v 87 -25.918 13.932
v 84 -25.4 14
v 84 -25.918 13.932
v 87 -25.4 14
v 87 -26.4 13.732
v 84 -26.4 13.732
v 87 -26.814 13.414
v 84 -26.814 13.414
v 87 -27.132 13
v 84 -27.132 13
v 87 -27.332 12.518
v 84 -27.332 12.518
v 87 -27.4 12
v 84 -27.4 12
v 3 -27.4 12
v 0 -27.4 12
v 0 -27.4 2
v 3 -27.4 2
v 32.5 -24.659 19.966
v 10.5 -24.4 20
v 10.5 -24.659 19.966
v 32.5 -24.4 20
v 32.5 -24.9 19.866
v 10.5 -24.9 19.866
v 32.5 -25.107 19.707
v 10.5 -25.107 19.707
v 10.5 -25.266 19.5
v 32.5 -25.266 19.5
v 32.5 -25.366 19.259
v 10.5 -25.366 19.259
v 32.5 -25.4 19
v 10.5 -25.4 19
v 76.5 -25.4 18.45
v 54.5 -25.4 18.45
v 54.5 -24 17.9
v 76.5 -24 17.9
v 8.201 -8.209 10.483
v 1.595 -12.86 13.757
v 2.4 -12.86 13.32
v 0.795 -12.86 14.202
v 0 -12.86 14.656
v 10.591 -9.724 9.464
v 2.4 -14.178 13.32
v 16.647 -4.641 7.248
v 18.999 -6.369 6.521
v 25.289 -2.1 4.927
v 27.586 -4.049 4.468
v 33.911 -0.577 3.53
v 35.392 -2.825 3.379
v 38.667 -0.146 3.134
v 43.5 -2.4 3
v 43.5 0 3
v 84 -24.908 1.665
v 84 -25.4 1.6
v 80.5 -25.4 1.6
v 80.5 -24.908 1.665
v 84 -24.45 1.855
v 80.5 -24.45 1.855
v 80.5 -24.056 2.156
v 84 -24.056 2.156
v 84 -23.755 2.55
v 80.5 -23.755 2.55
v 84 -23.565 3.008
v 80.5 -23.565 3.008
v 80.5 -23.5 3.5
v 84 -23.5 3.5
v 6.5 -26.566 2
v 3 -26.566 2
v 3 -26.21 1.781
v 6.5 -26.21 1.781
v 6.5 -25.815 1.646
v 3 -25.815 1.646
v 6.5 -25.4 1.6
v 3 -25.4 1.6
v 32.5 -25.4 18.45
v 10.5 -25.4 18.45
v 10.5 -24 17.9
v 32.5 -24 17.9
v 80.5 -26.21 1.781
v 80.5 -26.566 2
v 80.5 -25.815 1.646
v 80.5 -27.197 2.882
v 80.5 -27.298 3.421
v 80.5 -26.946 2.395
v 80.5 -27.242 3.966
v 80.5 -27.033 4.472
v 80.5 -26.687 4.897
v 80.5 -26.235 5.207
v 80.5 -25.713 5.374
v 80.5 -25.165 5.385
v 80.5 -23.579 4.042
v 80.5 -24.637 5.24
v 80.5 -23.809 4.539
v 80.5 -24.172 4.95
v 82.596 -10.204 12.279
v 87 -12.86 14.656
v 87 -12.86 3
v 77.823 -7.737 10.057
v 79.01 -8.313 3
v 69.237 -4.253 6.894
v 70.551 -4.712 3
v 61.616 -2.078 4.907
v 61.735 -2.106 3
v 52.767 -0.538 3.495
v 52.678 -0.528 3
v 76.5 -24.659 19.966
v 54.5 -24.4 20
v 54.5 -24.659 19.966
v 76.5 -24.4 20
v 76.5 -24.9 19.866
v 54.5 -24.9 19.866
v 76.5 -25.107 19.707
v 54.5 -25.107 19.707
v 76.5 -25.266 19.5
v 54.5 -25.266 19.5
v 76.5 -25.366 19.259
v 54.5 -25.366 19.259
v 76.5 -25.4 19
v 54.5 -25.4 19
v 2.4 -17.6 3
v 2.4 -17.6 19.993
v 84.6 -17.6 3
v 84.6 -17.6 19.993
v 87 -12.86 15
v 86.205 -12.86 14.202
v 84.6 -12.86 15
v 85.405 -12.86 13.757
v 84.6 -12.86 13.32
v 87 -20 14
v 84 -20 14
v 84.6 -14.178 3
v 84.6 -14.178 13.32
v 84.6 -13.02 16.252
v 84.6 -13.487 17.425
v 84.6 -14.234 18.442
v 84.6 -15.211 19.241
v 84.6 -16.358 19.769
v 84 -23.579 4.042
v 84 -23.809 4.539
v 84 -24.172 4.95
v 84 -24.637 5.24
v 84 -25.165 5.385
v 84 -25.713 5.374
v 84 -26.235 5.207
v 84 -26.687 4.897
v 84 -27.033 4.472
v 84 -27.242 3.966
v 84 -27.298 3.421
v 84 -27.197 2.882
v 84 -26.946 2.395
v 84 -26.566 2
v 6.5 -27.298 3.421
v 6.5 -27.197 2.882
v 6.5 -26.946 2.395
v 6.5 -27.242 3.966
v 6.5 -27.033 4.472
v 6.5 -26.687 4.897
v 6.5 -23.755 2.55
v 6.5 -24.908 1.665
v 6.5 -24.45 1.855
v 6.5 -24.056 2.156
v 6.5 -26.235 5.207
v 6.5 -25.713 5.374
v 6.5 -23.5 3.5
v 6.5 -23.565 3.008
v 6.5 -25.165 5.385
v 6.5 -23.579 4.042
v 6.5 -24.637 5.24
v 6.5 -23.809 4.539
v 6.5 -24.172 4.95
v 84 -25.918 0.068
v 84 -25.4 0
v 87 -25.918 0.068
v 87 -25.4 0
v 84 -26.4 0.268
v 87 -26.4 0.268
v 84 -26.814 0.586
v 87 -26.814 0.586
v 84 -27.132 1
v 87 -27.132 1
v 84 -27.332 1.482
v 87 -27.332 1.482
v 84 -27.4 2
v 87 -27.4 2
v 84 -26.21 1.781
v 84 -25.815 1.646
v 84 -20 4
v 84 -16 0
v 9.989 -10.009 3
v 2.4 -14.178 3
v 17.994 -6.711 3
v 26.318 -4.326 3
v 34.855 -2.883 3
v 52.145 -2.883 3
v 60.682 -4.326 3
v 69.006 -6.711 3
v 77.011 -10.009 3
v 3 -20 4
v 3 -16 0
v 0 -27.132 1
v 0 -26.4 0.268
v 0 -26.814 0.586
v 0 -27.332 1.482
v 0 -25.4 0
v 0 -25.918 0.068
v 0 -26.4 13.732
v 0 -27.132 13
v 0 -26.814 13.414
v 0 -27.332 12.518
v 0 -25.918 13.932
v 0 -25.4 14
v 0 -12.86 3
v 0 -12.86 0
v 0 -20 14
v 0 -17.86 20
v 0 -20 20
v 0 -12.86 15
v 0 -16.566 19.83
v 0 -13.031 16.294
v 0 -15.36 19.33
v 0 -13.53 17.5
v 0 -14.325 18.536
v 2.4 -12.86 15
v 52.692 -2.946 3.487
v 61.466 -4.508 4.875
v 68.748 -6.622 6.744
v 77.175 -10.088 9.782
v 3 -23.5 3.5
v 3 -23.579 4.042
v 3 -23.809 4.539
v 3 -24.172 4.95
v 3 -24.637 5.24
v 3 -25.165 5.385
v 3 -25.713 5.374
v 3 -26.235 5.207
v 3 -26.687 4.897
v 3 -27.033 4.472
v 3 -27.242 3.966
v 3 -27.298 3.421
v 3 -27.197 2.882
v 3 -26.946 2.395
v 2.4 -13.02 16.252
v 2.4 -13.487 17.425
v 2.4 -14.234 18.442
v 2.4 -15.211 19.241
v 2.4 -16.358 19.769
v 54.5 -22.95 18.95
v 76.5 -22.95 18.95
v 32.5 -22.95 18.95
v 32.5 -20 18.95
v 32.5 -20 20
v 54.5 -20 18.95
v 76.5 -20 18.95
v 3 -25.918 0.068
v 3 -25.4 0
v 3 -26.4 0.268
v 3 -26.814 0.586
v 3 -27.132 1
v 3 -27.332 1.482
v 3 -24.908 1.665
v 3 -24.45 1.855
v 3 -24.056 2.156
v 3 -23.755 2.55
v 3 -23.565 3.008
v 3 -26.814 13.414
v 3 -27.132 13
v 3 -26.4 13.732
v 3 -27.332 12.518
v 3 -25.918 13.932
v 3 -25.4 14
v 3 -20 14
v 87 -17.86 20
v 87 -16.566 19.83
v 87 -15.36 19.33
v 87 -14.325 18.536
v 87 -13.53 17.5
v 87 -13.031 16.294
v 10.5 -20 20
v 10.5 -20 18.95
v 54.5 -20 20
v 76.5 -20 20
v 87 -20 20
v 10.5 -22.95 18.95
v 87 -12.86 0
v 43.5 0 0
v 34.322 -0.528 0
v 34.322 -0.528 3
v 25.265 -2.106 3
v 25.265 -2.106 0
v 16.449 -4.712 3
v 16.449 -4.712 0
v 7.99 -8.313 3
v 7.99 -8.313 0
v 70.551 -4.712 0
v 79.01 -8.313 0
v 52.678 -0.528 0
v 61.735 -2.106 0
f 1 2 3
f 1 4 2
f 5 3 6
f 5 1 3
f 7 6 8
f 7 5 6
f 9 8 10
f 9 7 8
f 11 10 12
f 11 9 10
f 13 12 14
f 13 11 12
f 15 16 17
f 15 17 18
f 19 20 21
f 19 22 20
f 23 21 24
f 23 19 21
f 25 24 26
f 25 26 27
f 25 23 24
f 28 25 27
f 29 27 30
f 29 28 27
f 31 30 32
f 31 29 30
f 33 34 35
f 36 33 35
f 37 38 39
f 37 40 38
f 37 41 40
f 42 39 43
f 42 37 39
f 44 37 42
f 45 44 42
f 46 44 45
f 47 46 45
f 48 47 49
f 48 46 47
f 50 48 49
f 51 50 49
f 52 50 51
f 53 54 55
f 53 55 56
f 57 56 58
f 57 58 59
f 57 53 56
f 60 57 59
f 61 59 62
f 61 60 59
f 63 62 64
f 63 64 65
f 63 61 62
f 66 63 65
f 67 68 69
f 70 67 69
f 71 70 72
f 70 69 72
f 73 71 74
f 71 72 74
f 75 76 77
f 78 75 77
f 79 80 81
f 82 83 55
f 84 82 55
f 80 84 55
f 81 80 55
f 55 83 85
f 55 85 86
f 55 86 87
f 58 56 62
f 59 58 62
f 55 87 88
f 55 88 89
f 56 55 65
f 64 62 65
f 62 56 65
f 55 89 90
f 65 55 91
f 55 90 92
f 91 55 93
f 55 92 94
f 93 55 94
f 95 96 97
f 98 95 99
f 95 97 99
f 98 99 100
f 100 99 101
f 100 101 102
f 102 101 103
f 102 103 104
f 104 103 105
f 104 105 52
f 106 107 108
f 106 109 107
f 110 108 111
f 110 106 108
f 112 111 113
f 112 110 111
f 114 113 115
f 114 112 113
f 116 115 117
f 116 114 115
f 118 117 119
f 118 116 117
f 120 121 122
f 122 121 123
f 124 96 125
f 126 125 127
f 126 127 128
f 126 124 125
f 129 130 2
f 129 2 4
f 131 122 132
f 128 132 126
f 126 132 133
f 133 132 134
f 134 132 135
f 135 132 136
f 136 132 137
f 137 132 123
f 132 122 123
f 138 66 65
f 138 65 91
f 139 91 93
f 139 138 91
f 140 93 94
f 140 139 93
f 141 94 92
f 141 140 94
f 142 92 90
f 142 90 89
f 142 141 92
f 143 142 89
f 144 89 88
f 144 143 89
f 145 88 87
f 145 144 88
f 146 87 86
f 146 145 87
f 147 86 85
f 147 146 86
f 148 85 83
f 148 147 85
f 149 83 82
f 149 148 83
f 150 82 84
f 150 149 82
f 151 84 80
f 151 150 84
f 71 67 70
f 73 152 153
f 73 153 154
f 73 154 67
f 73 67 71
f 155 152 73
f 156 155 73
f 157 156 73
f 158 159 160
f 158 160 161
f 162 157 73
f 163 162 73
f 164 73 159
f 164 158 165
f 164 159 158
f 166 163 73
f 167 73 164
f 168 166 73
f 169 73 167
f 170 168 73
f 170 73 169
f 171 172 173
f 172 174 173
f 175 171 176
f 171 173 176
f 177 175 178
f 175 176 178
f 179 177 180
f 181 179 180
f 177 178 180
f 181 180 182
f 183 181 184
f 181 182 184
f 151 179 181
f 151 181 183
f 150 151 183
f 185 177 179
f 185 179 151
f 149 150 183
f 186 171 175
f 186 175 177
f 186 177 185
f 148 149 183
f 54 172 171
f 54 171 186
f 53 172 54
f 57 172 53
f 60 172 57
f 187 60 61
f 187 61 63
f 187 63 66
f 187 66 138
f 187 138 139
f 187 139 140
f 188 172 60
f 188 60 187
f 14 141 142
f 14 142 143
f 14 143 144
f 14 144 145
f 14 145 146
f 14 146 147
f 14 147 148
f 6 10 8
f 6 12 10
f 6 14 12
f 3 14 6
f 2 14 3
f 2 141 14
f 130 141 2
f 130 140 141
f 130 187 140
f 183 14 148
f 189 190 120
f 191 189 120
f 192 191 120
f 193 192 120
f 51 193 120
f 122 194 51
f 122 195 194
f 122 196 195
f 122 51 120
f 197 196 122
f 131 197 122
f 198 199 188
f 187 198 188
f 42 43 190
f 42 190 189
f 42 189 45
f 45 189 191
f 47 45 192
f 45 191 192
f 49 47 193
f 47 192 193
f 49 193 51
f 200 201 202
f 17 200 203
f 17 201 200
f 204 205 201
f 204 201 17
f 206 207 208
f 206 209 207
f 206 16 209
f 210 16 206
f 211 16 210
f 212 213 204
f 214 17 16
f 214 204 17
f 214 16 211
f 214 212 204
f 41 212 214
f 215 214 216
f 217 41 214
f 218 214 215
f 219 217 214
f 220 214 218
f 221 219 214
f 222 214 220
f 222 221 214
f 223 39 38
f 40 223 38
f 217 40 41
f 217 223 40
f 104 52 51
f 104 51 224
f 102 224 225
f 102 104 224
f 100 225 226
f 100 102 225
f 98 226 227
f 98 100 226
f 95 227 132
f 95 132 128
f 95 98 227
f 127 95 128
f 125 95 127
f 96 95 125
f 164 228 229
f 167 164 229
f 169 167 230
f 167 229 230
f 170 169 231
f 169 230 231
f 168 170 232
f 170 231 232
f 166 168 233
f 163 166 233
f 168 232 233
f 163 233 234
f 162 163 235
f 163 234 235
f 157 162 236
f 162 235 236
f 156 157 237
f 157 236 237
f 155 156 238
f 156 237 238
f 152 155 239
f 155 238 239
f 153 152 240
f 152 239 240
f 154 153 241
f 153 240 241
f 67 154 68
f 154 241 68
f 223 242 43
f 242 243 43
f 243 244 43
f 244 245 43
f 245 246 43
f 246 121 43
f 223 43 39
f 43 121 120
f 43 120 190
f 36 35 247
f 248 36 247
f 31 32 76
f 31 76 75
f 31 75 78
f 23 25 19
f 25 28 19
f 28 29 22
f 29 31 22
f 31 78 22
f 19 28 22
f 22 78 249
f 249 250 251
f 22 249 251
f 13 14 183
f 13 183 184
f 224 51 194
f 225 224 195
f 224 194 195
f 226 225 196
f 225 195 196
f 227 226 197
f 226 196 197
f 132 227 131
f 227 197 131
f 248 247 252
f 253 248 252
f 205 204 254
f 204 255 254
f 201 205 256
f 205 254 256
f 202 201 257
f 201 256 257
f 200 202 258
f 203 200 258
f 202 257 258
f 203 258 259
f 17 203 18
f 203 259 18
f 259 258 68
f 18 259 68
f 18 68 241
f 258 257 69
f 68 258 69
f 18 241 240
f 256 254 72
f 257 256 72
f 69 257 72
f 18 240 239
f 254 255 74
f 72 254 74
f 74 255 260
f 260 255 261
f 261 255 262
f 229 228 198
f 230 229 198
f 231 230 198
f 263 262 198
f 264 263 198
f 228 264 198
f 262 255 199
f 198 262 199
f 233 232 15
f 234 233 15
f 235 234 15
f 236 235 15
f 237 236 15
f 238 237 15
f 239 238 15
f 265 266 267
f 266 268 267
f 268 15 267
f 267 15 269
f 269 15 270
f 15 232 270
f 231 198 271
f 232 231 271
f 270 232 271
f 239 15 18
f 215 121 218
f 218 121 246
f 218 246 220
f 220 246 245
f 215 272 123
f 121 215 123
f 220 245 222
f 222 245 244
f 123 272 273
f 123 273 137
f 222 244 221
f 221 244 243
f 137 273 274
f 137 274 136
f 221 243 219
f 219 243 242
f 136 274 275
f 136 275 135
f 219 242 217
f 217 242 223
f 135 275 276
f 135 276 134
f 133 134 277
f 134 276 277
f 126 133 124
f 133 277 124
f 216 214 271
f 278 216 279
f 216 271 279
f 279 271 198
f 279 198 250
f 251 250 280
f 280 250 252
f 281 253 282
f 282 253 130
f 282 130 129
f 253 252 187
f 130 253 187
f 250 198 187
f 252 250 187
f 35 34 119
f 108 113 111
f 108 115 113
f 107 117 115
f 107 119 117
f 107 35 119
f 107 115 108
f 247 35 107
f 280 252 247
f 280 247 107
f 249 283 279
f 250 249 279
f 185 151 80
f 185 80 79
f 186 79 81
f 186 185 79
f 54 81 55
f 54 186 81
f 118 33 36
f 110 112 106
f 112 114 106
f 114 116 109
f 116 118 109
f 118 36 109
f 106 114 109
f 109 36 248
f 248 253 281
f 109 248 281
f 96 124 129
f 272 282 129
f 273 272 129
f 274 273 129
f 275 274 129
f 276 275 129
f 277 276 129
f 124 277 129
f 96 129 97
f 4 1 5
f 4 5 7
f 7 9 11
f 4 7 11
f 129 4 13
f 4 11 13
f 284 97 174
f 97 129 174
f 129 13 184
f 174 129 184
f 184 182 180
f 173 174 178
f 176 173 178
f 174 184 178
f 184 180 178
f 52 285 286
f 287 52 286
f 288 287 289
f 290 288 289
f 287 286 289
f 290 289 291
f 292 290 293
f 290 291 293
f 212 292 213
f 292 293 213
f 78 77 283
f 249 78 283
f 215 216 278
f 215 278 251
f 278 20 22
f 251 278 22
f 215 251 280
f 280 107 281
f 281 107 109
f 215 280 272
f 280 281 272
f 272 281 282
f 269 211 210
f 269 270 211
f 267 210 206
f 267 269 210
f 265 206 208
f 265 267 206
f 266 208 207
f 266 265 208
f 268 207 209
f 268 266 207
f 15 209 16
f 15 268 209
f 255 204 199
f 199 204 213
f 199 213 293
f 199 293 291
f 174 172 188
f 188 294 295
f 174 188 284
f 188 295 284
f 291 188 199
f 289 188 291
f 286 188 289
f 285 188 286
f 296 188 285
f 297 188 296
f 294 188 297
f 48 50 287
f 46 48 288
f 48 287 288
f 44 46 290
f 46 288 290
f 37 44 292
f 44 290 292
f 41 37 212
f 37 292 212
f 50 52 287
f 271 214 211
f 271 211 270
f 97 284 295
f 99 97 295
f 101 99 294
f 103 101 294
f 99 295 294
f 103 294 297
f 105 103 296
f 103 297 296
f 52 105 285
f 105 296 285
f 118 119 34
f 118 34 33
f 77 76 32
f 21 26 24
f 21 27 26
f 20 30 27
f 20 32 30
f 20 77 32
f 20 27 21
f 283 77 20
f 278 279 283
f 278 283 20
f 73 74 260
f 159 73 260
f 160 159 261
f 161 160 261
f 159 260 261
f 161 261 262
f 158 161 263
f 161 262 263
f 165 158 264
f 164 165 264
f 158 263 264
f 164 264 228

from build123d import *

# Parameters (mm, degrees)
F1_DEPTH  = 3
F3_DEPTH  = 17
F5_DEPTH  = 17.6
F6_W      = 3
F6_H      = 14
F7_DEPTH  = 7.4
F8_R      = 2
F6_W_2    = 22
F6_H_2    = 2.1
F9_DEPTH  = 5.4
F10_R     = 1
F12_SIZE  = 4
F14_DEPTH = 3.5
F18_DEPTH = 66
F20_DEPTH = 4.7397795647
F21_F1_R  = 4.9999


# Not quite as in the source:
# - a fillet or chamfer is up to 0.001 mm smaller than in the source, because OpenCascade refuses the exact size


with BuildPart() as f1:
    # F0 (on Top) → F1 (new body)
    with BuildSketch(Plane.XY):
        with BuildLine():
            Line((43.5, -20), (43.5, 0))
            ThreePointArc((43.5, 0), (20.8194176131, -3.2823932686), (0, -12.8602204353))
            Line((0, -12.8602204353), (0, -20))
            Line((0, -20), (43.5, -20))
        make_face()
        with BuildLine():
            ThreePointArc((87, -12.8602204353), (66.1805823869, -3.2823932686), (43.5, 0))
            Line((43.5, 0), (43.5, -20))
            Line((43.5, -20), (87, -20))
            Line((87, -20), (87, -12.8602204353))
        make_face()
    extrude(amount=F1_DEPTH)

    # F2 (on face) → F3 (join)
    with BuildSketch(Plane.XY.offset(3)):
        with BuildLine():
            ThreePointArc((87, -12.8602204353), (43.5, 0), (0, -12.8602204353))
            Line((0, -12.8602204353), (0, -20))
            Line((0, -20), (87, -20))
            Line((87, -20), (87, -12.8602204353))
        make_face()
        with BuildLine():
            Line((84.6, -17.6), (2.4, -17.6))
            Line((2.4, -17.6), (2.4, -14.1778912523))
            ThreePointArc((2.4, -14.1778912523), (43.5, -2.4), (84.6, -14.1778912523))
            Line((84.6, -14.1778912523), (84.6, -17.6))
        make_face(mode=Mode.SUBTRACT)
    extrude(amount=F3_DEPTH)

    # F4 (on Front) → F5 (cut, through all)
    with BuildSketch(Plane.XZ):
        with BuildLine():
            ThreePointArc((130.5, 90), (-18.0182899632, 151.5182899632), (43.5, 3))
            ThreePointArc((43.5, 3), (105.0182899632, 28.4817100368), (130.5, 90))
        make_face()
    extrude(amount=F5_DEPTH, mode=Mode.SUBTRACT)

    # F6 (on face) → F7 (join)
    with BuildSketch(Plane.XZ.offset(20)):
        with Locations((1.5, 7)):
            Rectangle(F6_W, F6_H)
        with Locations((85.5, 7)):
            Rectangle(F6_W, F6_H)
    extrude(amount=F7_DEPTH)

    # F8
    f8_edges = [f1.edges().sort_by_distance(p)[0] for p in [
        (1.5, -27.4, 0),
        (1.5, -27.4, 14),
        (85.5, -27.4, 14),
        (85.5, -27.4, 0),
    ]]
    fillet(f8_edges, radius=F8_R)

    # F6 (on face) → F9 (join)
    with BuildSketch(Plane.XZ.offset(20)):
        with Locations((21.5, 18.95)):
            Rectangle(F6_W_2, F6_H_2)
        with Locations((65.5, 18.95)):
            Rectangle(F6_W_2, F6_H_2)
    extrude(amount=F9_DEPTH)

    # F10
    f10_edges = [f1.edges().sort_by_distance(p)[0] for p in [
        (21.5, -25.4, 20),
        (65.5, -25.4, 20),
    ]]
    fillet(f10_edges, radius=F10_R)

    # F12
    f12_edges = [f1.edges().sort_by_distance(p)[0] for p in [
        (43.5, -20, 0),
    ]]
    chamfer(f12_edges, length=F12_SIZE)

    # F13 (on face) → F14 (join)
    with BuildSketch(Plane.YZ.offset(3)):
        with BuildLine():
            Line((-25.4, 2), (-26.566190379, 2))
            ThreePointArc((-26.566190379, 2), (-26.0164414003, 1.7027799244), (-25.4, 1.6))
            Line((-25.4, 1.6), (-25.4, 2))
        make_face()
        with BuildLine():
            ThreePointArc((-23.5, 3.5), (-26.2349366084, 5.2067163971), (-26.566190379, 2))
            Line((-26.566190379, 2), (-25.4, 2))
            Line((-25.4, 2), (-25.4, 1.6))
            ThreePointArc((-25.4, 1.6), (-24.0564971157, 2.1564971157), (-23.5, 3.5))
        make_face()
    extrude(amount=F14_DEPTH)

    # F17: F1 across plane


with BuildPart() as f1_1:
    add(f1.part)
    add(f1.part.mirror(Plane.YZ.offset(43.5)))

    # F11 (on face) → F18 (cut, through all)
    with BuildSketch(Plane(origin=(10.5, 0, 0), x_dir=(0, -1, 0), z_dir=(-1, 0, 0))):
        Polygon((22.95, 18.95), (20, 18.95), (20, 17.9), (24, 17.9), align=None)
        Polygon((25.4, 17.9), (25.4, 18.45), (24, 17.9), align=None)
    extrude(amount=-F18_DEPTH, mode=Mode.SUBTRACT)

    # F19 (on face) → F20 (join, through all)
    with BuildSketch(Plane(origin=(0, -17.6, 0), x_dir=(-1, 0, 0), z_dir=(0, 1, 0))):
        with BuildLine():
            Line((-84.6, 13.3202112679), (-84.6, 20))
            Line((-84.6, 20), (-87, 20))
            Line((-87, 20), (-87, 14.6557898708))
            ThreePointArc((-87, 14.6557898708), (-85.8052708602, 13.9785289708), (-84.6, 13.3202112679))
        make_face()
        with BuildLine():
            Line((-2.4, 20), (-2.4, 13.3202112679))
            ThreePointArc((-2.4, 13.3202112679), (-1.1947291398, 13.9785289708), (0, 14.6557898708))
            Line((0, 14.6557898708), (0, 20))
            Line((0, 20), (-2.4, 20))
        make_face()
    extrude(amount=F20_DEPTH)

    # F21: fillet of radius 5 on 2 edges, made by hand

    # F21_f1 (radius 5 in the source; OpenCascade refuses exactly that, so slightly less here)
    f21_f1_edges = [f1_1.edges().sort_by_distance(p)[0] for p in [
        (85.8, -12.8602204353, 20),
    ]]
    fillet(f21_f1_edges, radius=F21_F1_R)


solid = f1_1.part
